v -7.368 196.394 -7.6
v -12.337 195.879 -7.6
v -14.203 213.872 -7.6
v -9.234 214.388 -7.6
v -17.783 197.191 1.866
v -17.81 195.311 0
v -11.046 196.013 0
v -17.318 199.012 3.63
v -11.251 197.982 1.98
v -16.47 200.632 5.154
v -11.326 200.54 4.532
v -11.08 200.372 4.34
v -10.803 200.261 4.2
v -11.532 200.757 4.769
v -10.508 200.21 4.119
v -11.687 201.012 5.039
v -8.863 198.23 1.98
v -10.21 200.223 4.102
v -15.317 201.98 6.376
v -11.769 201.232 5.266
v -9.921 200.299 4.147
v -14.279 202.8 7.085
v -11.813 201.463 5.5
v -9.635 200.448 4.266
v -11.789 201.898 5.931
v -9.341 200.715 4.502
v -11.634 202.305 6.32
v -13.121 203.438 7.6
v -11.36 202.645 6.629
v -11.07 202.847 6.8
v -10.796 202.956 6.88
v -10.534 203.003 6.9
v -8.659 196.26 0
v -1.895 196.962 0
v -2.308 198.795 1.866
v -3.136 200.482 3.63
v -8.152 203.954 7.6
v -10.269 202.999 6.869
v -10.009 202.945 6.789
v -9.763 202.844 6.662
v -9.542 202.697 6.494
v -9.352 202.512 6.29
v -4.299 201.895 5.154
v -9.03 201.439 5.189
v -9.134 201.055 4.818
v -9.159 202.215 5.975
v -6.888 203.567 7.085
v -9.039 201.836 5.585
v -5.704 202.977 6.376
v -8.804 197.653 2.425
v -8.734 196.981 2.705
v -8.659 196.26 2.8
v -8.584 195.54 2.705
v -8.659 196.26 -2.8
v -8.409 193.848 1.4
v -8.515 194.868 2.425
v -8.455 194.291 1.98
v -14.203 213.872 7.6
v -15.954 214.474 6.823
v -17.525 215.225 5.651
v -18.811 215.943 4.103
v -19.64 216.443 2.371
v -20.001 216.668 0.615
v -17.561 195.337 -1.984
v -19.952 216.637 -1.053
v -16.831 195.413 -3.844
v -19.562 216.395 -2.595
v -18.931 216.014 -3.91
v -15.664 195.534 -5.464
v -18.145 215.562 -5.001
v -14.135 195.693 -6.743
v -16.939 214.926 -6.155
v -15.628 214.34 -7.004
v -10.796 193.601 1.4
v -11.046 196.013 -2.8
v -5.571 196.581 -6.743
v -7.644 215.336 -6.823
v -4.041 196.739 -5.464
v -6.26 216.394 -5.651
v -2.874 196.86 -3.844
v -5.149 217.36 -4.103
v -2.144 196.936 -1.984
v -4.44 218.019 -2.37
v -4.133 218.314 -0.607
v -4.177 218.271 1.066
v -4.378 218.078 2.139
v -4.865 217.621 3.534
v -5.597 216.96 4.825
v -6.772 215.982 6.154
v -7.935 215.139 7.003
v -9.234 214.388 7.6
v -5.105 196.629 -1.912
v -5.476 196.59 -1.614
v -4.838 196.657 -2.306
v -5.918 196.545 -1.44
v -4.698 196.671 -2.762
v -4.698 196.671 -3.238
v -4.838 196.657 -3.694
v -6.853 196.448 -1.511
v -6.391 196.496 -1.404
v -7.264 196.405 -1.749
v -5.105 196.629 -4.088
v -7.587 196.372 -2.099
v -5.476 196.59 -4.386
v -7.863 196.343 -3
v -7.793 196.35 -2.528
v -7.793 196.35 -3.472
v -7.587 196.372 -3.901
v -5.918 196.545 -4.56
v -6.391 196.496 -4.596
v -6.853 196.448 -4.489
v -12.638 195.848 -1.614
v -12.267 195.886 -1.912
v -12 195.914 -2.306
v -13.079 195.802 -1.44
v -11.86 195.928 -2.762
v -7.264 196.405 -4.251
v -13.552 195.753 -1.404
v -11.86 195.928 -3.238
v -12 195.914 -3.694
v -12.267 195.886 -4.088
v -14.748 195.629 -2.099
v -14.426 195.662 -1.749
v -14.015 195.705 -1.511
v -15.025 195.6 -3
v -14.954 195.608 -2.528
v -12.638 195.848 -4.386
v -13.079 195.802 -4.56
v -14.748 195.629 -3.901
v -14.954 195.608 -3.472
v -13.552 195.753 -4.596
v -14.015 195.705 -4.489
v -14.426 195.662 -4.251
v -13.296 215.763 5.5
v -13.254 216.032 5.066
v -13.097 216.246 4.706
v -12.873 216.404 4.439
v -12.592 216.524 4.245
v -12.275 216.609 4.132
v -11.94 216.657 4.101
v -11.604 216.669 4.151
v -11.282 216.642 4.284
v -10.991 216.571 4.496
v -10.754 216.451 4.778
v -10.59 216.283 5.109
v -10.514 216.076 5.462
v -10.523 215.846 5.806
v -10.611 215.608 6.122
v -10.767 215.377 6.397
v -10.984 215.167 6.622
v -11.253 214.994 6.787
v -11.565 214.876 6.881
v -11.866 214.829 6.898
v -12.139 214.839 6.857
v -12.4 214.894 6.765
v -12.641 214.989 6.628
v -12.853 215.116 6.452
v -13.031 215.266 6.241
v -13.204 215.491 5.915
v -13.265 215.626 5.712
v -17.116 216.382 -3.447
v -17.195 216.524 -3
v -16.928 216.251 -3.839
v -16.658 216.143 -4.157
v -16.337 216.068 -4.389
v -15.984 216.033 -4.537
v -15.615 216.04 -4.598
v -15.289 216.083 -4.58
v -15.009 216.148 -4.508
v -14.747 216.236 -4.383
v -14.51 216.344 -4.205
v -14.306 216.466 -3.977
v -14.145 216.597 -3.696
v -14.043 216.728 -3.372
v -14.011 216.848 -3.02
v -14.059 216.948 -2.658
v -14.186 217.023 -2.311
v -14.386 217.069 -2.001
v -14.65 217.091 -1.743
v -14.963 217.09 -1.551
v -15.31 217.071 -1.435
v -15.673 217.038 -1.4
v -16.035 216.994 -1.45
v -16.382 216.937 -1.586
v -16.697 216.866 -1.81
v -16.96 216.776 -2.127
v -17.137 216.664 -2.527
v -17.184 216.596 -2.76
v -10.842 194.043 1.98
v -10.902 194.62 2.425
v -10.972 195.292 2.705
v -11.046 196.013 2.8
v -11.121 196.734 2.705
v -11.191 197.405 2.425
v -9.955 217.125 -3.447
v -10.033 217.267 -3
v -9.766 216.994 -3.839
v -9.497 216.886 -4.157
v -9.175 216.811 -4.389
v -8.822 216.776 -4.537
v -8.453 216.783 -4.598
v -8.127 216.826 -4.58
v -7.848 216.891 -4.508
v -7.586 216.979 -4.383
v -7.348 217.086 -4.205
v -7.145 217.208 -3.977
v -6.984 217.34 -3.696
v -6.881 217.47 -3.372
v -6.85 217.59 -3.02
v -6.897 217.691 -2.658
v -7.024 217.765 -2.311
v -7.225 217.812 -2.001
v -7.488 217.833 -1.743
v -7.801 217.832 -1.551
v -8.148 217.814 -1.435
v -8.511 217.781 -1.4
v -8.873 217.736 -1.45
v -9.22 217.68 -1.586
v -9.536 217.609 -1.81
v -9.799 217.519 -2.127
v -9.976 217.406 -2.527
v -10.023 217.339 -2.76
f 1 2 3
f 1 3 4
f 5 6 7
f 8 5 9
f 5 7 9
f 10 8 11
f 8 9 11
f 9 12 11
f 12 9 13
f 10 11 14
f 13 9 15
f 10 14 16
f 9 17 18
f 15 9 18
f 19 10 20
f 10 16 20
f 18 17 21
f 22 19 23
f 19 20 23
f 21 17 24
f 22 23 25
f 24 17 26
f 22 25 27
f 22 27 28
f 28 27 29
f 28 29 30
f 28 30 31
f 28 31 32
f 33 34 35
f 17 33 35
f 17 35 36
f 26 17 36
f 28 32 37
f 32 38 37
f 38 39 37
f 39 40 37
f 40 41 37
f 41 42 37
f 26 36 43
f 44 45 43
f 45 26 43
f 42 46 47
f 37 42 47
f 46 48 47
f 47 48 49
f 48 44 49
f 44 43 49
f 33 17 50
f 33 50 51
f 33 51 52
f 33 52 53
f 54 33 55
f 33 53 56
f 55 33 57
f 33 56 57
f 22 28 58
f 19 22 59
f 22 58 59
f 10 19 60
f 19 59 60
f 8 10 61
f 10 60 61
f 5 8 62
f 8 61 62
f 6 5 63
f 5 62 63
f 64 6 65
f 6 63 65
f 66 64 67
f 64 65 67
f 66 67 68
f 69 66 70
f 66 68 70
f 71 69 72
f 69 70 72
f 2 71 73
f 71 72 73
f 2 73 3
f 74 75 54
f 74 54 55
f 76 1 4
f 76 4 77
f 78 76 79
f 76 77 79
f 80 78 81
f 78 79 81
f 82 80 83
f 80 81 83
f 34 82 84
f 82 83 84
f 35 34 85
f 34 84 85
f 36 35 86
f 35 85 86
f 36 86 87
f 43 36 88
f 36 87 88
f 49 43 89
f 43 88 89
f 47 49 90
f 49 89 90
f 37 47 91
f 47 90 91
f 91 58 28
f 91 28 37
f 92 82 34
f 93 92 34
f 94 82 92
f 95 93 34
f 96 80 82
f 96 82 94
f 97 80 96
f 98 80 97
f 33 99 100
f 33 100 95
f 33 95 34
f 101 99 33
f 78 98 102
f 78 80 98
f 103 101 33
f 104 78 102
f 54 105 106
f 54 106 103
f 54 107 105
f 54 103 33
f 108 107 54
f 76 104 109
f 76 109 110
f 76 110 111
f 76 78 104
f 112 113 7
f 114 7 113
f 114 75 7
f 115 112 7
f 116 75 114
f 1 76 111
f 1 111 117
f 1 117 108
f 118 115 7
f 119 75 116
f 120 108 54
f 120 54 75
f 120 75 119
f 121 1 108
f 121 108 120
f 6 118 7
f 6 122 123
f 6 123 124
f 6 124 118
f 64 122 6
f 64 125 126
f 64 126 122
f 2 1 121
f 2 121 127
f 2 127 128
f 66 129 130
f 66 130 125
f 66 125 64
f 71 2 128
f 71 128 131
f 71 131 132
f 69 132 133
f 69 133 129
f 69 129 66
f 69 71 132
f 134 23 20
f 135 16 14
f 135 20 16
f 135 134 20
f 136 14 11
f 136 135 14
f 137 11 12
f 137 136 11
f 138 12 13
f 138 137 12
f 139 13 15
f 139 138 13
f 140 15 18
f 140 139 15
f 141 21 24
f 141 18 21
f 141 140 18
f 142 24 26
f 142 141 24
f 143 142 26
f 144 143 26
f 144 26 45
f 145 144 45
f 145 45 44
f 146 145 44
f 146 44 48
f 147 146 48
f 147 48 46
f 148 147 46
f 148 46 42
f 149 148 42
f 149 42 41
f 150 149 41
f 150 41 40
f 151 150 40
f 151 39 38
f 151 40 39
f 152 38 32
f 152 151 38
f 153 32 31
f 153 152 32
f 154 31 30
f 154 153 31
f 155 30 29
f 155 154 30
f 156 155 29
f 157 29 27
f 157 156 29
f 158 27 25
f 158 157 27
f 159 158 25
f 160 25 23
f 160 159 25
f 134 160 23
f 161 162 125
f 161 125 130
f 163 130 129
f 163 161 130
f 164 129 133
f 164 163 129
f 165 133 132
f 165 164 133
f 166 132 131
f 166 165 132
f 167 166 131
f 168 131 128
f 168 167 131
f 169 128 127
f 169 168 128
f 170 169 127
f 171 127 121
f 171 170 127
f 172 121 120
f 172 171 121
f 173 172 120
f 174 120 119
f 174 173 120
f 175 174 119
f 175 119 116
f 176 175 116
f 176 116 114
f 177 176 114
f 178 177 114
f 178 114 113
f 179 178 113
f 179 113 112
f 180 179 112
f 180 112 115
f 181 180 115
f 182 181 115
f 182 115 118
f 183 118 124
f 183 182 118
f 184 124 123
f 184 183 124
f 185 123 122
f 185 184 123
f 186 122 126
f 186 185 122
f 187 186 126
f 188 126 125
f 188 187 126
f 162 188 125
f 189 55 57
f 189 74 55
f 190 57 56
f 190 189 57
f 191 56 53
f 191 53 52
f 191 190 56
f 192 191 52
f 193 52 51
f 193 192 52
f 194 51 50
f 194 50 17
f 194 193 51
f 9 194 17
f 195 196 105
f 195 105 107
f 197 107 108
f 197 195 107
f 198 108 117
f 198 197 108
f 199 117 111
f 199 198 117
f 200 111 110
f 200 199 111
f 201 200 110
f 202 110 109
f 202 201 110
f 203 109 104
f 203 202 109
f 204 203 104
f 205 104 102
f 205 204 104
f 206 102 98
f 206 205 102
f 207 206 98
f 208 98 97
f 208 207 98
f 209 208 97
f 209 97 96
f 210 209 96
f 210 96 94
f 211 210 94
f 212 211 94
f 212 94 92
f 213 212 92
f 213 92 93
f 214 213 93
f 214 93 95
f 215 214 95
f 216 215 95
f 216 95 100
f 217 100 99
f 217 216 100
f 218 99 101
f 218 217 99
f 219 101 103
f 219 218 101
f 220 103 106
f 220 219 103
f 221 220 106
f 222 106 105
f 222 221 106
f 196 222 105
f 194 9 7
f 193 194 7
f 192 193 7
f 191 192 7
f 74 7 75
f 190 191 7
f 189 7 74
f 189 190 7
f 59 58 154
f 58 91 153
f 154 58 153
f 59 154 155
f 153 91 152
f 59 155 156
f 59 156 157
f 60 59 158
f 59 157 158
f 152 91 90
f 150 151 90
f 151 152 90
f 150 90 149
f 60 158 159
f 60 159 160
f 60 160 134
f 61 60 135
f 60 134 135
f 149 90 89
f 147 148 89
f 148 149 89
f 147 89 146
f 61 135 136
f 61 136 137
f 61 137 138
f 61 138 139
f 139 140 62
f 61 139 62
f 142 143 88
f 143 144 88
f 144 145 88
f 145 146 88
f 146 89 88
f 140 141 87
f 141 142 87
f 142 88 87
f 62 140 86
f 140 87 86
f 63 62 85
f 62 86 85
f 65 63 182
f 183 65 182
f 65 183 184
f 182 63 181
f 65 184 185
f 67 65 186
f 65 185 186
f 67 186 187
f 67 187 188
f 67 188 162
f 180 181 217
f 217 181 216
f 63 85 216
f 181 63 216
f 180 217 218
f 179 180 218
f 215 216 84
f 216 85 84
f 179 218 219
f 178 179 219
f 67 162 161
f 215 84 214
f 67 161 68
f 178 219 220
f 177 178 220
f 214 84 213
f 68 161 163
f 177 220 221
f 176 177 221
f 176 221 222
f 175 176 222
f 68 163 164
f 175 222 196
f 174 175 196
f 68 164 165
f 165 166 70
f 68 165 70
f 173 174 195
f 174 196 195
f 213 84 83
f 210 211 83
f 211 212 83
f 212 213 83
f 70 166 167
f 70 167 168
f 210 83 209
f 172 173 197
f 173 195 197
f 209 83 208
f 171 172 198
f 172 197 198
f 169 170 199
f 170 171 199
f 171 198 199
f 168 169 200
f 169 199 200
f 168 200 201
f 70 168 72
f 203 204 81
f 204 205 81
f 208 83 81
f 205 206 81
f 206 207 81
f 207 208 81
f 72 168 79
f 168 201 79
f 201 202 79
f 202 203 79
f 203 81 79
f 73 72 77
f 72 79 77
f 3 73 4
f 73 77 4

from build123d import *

# Parameters (mm, degrees)
SKETCH3_R               = 8
BOSS_EXTRUDE1_DEPTH     = 21.614736842
CUT_EXTRUDE1_DEPTH      = 11.217678336
CUT_EXTRUDE1_DEPTH_BACK = 11.217678336
CUT_EXTRUDE2_DEPTH      = 11.204574664
CUT_EXTRUDE2_DEPTH_BACK = 11.204574665
BOSS_EXTRUDE3_DEPTH     = 1.2
SKETCH8_R               = 1.6
SKETCH8_R_2             = 1.4
CUT_EXTRUDE3_DEPTH      = 25.957729977
CUT_EXTRUDE3_DEPTH_BACK = 2.513887999
CUT_EXTRUDE4_DEPTH      = 24.128624841


with BuildPart() as part:
    # Sketch3 → Boss-Extrude1 (new body)
    with BuildSketch(Plane(origin=(-12.082314344, 217.636022384, 0), x_dir=(-0.994665758, -0.103150523, 0), z_dir=(0.103150523, -0.994665758, 0))):
        Circle(SKETCH3_R)
    extrude(amount=BOSS_EXTRUDE1_DEPTH)

    # Sketch4 → Cut-Extrude1 (cut, two sides)
    with BuildSketch(Plane(origin=(10.375761543, 1.076004901, 0), x_dir=(0.103150523, -0.994665758, 0), z_dir=(-0.994665758, -0.103150523, 0))) as cut_extrude1_sk:
        with BuildLine():
            Line((-217.721396158, 8), (-213.721396158, 8))
            ThreePointArc((-213.721396158, 8), (-217.59367935, 0), (-213.721396158, -8))
            Line((-213.721396158, -8), (-217.721396158, -8))
            Line((-217.721396158, -8), (-217.721396158, 8))
        make_face()
    extrude(amount=CUT_EXTRUDE1_DEPTH, mode=Mode.SUBTRACT)
    extrude(cut_extrude1_sk.sketch, amount=-CUT_EXTRUDE1_DEPTH_BACK, mode=Mode.SUBTRACT)

    # Sketch5 → Cut-Extrude2 (cut, two sides)
    with BuildSketch(Plane(origin=(10.375761543, 1.076004901, 0), x_dir=(0.103150523, -0.994665758, 0), z_dir=(-0.994665758, -0.103150523, 0))) as cut_extrude2_sk:
        Polygon((-196.106659316, 0), (-204.106659316, 8), (-196.106659316, 8), align=None)
    extrude(amount=CUT_EXTRUDE2_DEPTH, mode=Mode.SUBTRACT)
    extrude(cut_extrude2_sk.sketch, amount=-CUT_EXTRUDE2_DEPTH_BACK, mode=Mode.SUBTRACT)

    # Sketch7 → Boss-Extrude3 (add, symmetric)
    with BuildSketch(Plane(origin=(10.375761543, 1.076004901, 0), x_dir=(0.103150523, -0.994665758, 0), z_dir=(-0.994665758, -0.103150523, 0))):
        with BuildLine():
            Line((-198.086558303, 1.979898987), (-196.106659316, 0))
            Line((-196.106659316, 0), (-196.106659316, -2.8))
            Line((-196.106659316, -2.8), (-193.681788185, 1.4))
            ThreePointArc((-193.681788185, 1.4), (-195.741185977, 2.776045612), (-198.086558303, 1.979898987))
        make_face()
    extrude(amount=BOSS_EXTRUDE3_DEPTH, both=True)

    # Sketch8 → Cut-Extrude3 (cut, two sides)
    with BuildSketch(Plane(origin=(-12.082314344, 217.636022384, 0), x_dir=(-0.994665758, -0.103150523, 0), z_dir=(0.103150523, -0.994665758, 0))) as cut_extrude3_sk:
        with Locations((-3.6, 3)):
            Circle(SKETCH8_R)
        with Locations((3.6, 3)):
            Circle(SKETCH8_R)
        with Locations((0, -5.5)):
            Circle(SKETCH8_R_2)
    extrude(amount=CUT_EXTRUDE3_DEPTH, mode=Mode.SUBTRACT)
    extrude(cut_extrude3_sk.sketch, amount=-CUT_EXTRUDE3_DEPTH_BACK, mode=Mode.SUBTRACT)

    # Sketch9 → Cut-Extrude4 (cut, through all)
    with BuildSketch(Plane(origin=(-20.228504477, 195.060578884, 0), x_dir=(0.994665758, 0.103150523, 0), z_dir=(0.103150523, -0.994665758, 0))):
        with BuildLine():
            Line((7.933405986, -7.6), (12.929404385, -7.6))
            ThreePointArc((12.929404385, -7.6), (10.431405186, -8), (7.933405986, -7.6))
        make_face()
        with BuildLine():
            Line((7.933405986, 7.6), (12.929404385, 7.6))
            ThreePointArc((12.929404385, 7.6), (10.431405186, 8), (7.933405986, 7.6))
        make_face()
    extrude(amount=-CUT_EXTRUDE4_DEPTH, mode=Mode.SUBTRACT)


solid = part.part
